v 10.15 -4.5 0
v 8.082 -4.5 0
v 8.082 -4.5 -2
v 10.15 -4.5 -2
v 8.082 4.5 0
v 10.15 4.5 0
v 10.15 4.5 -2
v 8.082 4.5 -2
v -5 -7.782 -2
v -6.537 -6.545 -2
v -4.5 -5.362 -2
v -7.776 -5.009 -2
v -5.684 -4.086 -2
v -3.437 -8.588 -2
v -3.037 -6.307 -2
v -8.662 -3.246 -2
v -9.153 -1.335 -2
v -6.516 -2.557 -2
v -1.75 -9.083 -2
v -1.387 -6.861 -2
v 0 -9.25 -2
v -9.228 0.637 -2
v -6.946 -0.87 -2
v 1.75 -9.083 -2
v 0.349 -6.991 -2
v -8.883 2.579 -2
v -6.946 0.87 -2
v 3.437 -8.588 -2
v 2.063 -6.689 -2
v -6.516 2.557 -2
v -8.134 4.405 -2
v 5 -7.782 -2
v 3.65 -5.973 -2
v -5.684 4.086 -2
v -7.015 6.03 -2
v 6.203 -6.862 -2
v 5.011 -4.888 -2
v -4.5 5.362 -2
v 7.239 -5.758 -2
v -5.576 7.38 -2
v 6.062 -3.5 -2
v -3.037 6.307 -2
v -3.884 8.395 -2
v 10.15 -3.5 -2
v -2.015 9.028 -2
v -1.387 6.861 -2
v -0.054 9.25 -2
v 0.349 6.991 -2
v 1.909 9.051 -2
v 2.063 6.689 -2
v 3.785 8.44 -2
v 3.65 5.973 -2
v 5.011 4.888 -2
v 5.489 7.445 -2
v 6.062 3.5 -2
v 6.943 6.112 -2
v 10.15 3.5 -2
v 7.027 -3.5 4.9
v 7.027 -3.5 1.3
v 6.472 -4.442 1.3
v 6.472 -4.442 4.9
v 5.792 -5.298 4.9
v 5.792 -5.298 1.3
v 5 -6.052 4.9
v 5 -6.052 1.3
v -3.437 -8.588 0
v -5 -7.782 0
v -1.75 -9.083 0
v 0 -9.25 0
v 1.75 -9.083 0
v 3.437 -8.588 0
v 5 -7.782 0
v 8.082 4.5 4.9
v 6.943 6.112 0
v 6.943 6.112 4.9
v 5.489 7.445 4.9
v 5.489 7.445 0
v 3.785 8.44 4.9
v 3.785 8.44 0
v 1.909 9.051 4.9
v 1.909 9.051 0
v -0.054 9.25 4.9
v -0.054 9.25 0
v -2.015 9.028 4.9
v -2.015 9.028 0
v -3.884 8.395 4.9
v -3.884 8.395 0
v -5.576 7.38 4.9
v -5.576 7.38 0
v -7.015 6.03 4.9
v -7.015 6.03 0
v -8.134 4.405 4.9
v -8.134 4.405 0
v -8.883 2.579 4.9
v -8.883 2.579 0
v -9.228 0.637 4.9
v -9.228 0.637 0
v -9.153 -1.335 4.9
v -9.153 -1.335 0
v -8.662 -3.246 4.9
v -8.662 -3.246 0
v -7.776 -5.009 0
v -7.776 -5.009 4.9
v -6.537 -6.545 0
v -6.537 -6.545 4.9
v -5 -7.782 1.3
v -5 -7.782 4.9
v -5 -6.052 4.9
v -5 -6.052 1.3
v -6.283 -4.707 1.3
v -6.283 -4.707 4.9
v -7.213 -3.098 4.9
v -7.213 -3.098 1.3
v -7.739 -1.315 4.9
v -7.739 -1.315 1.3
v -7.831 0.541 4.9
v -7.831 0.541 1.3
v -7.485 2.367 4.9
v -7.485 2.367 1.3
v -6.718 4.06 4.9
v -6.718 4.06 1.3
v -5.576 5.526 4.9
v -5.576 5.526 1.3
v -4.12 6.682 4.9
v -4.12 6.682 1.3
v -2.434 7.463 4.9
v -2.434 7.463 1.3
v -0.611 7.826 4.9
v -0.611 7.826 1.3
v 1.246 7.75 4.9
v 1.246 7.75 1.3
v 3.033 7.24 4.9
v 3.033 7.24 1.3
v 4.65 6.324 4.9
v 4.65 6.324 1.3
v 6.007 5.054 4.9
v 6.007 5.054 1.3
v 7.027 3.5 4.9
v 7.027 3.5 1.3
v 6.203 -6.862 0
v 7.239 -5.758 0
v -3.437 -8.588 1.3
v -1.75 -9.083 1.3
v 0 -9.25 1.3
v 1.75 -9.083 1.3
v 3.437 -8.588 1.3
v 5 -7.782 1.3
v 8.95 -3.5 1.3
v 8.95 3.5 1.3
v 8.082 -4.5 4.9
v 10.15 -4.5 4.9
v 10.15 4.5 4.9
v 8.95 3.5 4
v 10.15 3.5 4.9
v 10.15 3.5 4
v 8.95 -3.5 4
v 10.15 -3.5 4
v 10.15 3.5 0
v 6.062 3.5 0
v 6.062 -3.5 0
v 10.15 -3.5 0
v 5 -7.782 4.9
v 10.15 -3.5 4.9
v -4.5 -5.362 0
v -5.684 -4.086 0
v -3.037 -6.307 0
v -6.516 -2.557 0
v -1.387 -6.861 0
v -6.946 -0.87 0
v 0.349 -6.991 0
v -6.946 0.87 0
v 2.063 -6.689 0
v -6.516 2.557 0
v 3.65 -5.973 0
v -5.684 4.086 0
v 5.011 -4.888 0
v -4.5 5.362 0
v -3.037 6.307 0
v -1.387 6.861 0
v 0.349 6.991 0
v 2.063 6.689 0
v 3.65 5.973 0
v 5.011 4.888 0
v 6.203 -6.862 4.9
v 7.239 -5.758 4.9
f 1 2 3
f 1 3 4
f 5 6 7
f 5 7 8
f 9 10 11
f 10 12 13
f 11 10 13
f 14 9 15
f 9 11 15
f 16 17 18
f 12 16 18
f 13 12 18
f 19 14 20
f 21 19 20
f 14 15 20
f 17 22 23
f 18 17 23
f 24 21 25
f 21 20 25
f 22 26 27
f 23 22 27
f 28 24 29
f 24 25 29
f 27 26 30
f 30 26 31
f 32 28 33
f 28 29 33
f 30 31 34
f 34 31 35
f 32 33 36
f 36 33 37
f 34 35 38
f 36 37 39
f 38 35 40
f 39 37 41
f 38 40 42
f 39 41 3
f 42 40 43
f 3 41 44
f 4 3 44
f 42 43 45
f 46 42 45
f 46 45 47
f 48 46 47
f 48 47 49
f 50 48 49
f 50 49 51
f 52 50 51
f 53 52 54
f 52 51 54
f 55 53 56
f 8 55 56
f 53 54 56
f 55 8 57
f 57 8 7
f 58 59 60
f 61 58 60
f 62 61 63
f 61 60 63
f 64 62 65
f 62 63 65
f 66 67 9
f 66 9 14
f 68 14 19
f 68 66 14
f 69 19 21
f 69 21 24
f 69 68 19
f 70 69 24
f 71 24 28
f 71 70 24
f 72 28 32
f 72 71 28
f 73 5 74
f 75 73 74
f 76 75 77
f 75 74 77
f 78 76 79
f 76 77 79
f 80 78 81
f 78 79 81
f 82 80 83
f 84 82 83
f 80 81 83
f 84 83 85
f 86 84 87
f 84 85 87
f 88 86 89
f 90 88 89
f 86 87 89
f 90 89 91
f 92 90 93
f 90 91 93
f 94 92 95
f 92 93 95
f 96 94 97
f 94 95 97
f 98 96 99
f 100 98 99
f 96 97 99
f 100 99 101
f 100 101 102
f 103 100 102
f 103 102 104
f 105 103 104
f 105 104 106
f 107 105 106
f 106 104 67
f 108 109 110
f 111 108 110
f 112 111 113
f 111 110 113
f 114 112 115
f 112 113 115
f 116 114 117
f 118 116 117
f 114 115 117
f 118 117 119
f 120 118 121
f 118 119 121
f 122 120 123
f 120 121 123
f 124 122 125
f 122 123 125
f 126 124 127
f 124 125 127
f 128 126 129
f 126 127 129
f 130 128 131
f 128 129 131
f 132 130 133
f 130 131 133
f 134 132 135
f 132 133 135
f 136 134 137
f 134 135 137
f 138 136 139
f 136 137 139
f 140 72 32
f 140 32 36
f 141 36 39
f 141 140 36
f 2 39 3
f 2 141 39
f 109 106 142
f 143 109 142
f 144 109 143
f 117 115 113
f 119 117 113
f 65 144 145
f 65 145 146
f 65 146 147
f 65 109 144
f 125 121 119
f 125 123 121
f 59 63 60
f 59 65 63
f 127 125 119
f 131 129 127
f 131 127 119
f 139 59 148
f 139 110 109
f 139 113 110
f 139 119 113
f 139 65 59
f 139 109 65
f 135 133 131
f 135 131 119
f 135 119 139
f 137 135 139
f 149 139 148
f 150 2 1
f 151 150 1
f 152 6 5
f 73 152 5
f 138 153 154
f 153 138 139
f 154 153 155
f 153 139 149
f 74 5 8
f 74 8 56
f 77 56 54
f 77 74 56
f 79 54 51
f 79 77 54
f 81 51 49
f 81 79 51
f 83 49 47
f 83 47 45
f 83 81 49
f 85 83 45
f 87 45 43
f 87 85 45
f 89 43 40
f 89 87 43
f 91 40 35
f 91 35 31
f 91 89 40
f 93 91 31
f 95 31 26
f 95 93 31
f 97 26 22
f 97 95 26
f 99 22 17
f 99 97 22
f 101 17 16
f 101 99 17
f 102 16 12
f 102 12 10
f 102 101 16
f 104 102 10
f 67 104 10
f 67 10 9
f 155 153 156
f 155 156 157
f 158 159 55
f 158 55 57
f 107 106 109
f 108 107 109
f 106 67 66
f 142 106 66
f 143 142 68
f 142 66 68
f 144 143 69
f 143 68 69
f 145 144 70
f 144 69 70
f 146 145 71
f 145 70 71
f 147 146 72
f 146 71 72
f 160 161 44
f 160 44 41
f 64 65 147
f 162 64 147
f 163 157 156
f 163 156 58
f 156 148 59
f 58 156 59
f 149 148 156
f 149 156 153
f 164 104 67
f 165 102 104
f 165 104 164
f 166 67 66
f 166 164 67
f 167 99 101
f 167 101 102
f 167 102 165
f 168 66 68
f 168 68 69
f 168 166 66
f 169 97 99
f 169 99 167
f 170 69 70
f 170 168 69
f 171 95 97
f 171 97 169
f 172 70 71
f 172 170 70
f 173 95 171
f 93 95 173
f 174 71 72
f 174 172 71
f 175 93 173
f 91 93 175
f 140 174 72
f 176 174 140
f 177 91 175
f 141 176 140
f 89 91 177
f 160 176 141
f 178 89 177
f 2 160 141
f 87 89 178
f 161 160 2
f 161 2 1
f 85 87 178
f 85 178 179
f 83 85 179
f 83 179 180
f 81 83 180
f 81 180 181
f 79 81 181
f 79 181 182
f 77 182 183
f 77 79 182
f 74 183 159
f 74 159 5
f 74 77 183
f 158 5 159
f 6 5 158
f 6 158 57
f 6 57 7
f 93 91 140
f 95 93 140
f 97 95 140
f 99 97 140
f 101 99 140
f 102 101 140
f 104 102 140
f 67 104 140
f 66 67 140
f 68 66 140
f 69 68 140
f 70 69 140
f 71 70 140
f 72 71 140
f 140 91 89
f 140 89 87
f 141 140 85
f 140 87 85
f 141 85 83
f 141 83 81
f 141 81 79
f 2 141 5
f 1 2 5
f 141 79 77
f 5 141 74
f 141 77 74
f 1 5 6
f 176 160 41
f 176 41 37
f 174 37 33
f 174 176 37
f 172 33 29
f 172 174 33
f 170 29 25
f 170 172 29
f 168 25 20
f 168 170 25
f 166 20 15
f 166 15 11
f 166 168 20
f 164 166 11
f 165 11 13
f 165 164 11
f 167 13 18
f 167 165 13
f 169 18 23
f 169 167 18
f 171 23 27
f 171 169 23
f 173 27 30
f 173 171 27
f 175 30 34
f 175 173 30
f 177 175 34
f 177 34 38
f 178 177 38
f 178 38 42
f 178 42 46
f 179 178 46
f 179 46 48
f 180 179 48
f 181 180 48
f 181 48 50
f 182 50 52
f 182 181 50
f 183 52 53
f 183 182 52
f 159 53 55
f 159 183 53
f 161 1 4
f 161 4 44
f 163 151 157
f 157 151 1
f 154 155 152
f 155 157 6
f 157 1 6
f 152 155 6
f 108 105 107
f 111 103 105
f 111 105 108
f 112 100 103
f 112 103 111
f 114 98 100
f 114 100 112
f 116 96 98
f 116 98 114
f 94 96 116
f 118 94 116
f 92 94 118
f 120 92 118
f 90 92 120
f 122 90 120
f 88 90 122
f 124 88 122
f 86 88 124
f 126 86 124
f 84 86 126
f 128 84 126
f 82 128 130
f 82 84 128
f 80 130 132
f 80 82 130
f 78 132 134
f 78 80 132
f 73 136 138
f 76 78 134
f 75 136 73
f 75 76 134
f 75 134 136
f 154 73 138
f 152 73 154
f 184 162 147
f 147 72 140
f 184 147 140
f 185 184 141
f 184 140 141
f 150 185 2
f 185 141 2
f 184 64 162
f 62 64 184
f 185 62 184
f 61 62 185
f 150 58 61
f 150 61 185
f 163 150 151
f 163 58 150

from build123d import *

# Parameters (mm, degrees)
F0_W     = 1.2
F0_H     = 7
F1_DEPTH = 1.3
F2_DEPTH = 4.9
F3_DEPTH = 4
F4_DEPTH = 2


with BuildPart() as f1:
    # F0 (on Top) → F1 (new body)
    with BuildSketch(Plane.XY):
        with BuildLine():
            ThreePointArc((-5, -6.0516526668), (-4.8821358287, 6.147133458), (7.026556767, 3.5))
            Line((7.026556767, 3.5), (8.95, 3.5))
            Line((8.95, 3.5), (10.15, 3.5))
            Line((10.15, 3.5), (10.15, 4.5))
            Line((10.15, 4.5), (8.0816149376, 4.5))
            ThreePointArc((8.0816149376, 4.5), (-6.3314408213, 6.7435418828), (-5, -7.7821912081))
            Line((-5, -7.7821912081), (-5, -6.0516526668))
        make_face()
        with BuildLine():
            ThreePointArc((5, -6.0516526668), (0, -7.85), (-5, -6.0516526668))
            Line((-5, -6.0516526668), (-5, -7.7821912081))
            ThreePointArc((-5, -7.7821912081), (0, -9.25), (5, -7.7821912081))
            Line((5, -7.7821912081), (5, -6.0516526668))
        make_face()
        with Locations((9.55, 0)):
            Rectangle(F0_W, F0_H)
        with BuildLine():
            ThreePointArc((7.026556767, -3.5), (6.147133458, -4.8821358287), (5, -6.0516526668))
            Line((5, -6.0516526668), (5, -7.7821912081))
            ThreePointArc((5, -7.7821912081), (6.7435418828, -6.3314408213), (8.0816149376, -4.5))
            Line((8.0816149376, -4.5), (10.15, -4.5))
            Line((10.15, -4.5), (10.15, -3.5))
            Line((10.15, -3.5), (8.95, -3.5))
            Line((8.95, -3.5), (7.026556767, -3.5))
        make_face()
        with BuildLine():
            Line((8.95, 3.5), (7.026556767, 3.5))
            Line((7.026556767, 3.5), (6.75, 3.5))
            Line((6.75, 3.5), (6.0621778265, 3.5))
            ThreePointArc((6.0621778265, 3.5), (6.761480784, 1.8117333157), (7, 0))
            ThreePointArc((7, 0), (6.761480784, -1.8117333157), (6.0621778265, -3.5))
            Line((6.0621778265, -3.5), (6.75, -3.5))
            Line((6.75, -3.5), (7.026556767, -3.5))
            Line((7.026556767, -3.5), (8.95, -3.5))
            Line((8.95, -3.5), (8.95, 3.5))
        make_face()
        with BuildLine():
            ThreePointArc((7, 0), (6.761480784, 1.8117333157), (6.0621778265, 3.5))
            ThreePointArc((6.0621778265, 3.5), (-7, 0), (6.0621778265, -3.5))
            ThreePointArc((6.0621778265, -3.5), (6.761480784, -1.8117333157), (7, 0))
        make_face()
        with BuildLine():
            Line((6.75, 3.5), (7.026556767, 3.5))
            ThreePointArc((7.026556767, 3.5), (-4.8821358287, 6.147133458), (-5, -6.0516526668))
            ThreePointArc((-5, -6.0516526668), (0, -7.85), (5, -6.0516526668))
            ThreePointArc((5, -6.0516526668), (6.147133458, -4.8821358287), (7.026556767, -3.5))
            Line((7.026556767, -3.5), (6.75, -3.5))
            Line((6.75, -3.5), (6.0621778265, -3.5))
            ThreePointArc((6.0621778265, -3.5), (-7, 0), (6.0621778265, 3.5))
            Line((6.0621778265, 3.5), (6.75, 3.5))
        make_face()
    extrude(amount=F1_DEPTH)

    # F0 (on Top) → F2 (join)
    with BuildSketch(Plane.XY):
        with BuildLine():
            ThreePointArc((-5, -6.0516526668), (-4.8821358287, 6.147133458), (7.026556767, 3.5))
            Line((7.026556767, 3.5), (8.95, 3.5))
            Line((8.95, 3.5), (10.15, 3.5))
            Line((10.15, 3.5), (10.15, 4.5))
            Line((10.15, 4.5), (8.0816149376, 4.5))
            ThreePointArc((8.0816149376, 4.5), (-6.3314408213, 6.7435418828), (-5, -7.7821912081))
            Line((-5, -7.7821912081), (-5, -6.0516526668))
        make_face()
        with BuildLine():
            ThreePointArc((7.026556767, -3.5), (6.147133458, -4.8821358287), (5, -6.0516526668))
            Line((5, -6.0516526668), (5, -7.7821912081))
            ThreePointArc((5, -7.7821912081), (6.7435418828, -6.3314408213), (8.0816149376, -4.5))
            Line((8.0816149376, -4.5), (10.15, -4.5))
            Line((10.15, -4.5), (10.15, -3.5))
            Line((10.15, -3.5), (8.95, -3.5))
            Line((8.95, -3.5), (7.026556767, -3.5))
        make_face()
    extrude(amount=F2_DEPTH)

    # F0 (on Top) → F3 (join)
    with BuildSketch(Plane.XY):
        with Locations((9.55, 0)):
            Rectangle(F0_W, F0_H)
    extrude(amount=F3_DEPTH)


with BuildPart() as f4:
    # F0 (on Top) → F4 (new body)
    with BuildSketch(Plane.XY):
        with BuildLine():
            ThreePointArc((-5, -6.0516526668), (-4.8821358287, 6.147133458), (7.026556767, 3.5))
            Line((7.026556767, 3.5), (8.95, 3.5))
            Line((8.95, 3.5), (10.15, 3.5))
            Line((10.15, 3.5), (10.15, 4.5))
            Line((10.15, 4.5), (8.0816149376, 4.5))
            ThreePointArc((8.0816149376, 4.5), (-6.3314408213, 6.7435418828), (-5, -7.7821912081))
            Line((-5, -7.7821912081), (-5, -6.0516526668))
        make_face()
        with BuildLine():
            ThreePointArc((5, -6.0516526668), (0, -7.85), (-5, -6.0516526668))
            Line((-5, -6.0516526668), (-5, -7.7821912081))
            ThreePointArc((-5, -7.7821912081), (0, -9.25), (5, -7.7821912081))
            Line((5, -7.7821912081), (5, -6.0516526668))
        make_face()
        with BuildLine():
            ThreePointArc((7.026556767, -3.5), (6.147133458, -4.8821358287), (5, -6.0516526668))
            Line((5, -6.0516526668), (5, -7.7821912081))
            ThreePointArc((5, -7.7821912081), (6.7435418828, -6.3314408213), (8.0816149376, -4.5))
            Line((8.0816149376, -4.5), (10.15, -4.5))
            Line((10.15, -4.5), (10.15, -3.5))
            Line((10.15, -3.5), (8.95, -3.5))
            Line((8.95, -3.5), (7.026556767, -3.5))
        make_face()
        with BuildLine():
            Line((6.75, 3.5), (7.026556767, 3.5))
            ThreePointArc((7.026556767, 3.5), (-4.8821358287, 6.147133458), (-5, -6.0516526668))
            ThreePointArc((-5, -6.0516526668), (0, -7.85), (5, -6.0516526668))
            ThreePointArc((5, -6.0516526668), (6.147133458, -4.8821358287), (7.026556767, -3.5))
            Line((7.026556767, -3.5), (6.75, -3.5))
            Line((6.75, -3.5), (6.0621778265, -3.5))
            ThreePointArc((6.0621778265, -3.5), (-7, 0), (6.0621778265, 3.5))
            Line((6.0621778265, 3.5), (6.75, 3.5))
        make_face()
    extrude(amount=-F4_DEPTH)


solid = Compound([f1.part, f4.part])
